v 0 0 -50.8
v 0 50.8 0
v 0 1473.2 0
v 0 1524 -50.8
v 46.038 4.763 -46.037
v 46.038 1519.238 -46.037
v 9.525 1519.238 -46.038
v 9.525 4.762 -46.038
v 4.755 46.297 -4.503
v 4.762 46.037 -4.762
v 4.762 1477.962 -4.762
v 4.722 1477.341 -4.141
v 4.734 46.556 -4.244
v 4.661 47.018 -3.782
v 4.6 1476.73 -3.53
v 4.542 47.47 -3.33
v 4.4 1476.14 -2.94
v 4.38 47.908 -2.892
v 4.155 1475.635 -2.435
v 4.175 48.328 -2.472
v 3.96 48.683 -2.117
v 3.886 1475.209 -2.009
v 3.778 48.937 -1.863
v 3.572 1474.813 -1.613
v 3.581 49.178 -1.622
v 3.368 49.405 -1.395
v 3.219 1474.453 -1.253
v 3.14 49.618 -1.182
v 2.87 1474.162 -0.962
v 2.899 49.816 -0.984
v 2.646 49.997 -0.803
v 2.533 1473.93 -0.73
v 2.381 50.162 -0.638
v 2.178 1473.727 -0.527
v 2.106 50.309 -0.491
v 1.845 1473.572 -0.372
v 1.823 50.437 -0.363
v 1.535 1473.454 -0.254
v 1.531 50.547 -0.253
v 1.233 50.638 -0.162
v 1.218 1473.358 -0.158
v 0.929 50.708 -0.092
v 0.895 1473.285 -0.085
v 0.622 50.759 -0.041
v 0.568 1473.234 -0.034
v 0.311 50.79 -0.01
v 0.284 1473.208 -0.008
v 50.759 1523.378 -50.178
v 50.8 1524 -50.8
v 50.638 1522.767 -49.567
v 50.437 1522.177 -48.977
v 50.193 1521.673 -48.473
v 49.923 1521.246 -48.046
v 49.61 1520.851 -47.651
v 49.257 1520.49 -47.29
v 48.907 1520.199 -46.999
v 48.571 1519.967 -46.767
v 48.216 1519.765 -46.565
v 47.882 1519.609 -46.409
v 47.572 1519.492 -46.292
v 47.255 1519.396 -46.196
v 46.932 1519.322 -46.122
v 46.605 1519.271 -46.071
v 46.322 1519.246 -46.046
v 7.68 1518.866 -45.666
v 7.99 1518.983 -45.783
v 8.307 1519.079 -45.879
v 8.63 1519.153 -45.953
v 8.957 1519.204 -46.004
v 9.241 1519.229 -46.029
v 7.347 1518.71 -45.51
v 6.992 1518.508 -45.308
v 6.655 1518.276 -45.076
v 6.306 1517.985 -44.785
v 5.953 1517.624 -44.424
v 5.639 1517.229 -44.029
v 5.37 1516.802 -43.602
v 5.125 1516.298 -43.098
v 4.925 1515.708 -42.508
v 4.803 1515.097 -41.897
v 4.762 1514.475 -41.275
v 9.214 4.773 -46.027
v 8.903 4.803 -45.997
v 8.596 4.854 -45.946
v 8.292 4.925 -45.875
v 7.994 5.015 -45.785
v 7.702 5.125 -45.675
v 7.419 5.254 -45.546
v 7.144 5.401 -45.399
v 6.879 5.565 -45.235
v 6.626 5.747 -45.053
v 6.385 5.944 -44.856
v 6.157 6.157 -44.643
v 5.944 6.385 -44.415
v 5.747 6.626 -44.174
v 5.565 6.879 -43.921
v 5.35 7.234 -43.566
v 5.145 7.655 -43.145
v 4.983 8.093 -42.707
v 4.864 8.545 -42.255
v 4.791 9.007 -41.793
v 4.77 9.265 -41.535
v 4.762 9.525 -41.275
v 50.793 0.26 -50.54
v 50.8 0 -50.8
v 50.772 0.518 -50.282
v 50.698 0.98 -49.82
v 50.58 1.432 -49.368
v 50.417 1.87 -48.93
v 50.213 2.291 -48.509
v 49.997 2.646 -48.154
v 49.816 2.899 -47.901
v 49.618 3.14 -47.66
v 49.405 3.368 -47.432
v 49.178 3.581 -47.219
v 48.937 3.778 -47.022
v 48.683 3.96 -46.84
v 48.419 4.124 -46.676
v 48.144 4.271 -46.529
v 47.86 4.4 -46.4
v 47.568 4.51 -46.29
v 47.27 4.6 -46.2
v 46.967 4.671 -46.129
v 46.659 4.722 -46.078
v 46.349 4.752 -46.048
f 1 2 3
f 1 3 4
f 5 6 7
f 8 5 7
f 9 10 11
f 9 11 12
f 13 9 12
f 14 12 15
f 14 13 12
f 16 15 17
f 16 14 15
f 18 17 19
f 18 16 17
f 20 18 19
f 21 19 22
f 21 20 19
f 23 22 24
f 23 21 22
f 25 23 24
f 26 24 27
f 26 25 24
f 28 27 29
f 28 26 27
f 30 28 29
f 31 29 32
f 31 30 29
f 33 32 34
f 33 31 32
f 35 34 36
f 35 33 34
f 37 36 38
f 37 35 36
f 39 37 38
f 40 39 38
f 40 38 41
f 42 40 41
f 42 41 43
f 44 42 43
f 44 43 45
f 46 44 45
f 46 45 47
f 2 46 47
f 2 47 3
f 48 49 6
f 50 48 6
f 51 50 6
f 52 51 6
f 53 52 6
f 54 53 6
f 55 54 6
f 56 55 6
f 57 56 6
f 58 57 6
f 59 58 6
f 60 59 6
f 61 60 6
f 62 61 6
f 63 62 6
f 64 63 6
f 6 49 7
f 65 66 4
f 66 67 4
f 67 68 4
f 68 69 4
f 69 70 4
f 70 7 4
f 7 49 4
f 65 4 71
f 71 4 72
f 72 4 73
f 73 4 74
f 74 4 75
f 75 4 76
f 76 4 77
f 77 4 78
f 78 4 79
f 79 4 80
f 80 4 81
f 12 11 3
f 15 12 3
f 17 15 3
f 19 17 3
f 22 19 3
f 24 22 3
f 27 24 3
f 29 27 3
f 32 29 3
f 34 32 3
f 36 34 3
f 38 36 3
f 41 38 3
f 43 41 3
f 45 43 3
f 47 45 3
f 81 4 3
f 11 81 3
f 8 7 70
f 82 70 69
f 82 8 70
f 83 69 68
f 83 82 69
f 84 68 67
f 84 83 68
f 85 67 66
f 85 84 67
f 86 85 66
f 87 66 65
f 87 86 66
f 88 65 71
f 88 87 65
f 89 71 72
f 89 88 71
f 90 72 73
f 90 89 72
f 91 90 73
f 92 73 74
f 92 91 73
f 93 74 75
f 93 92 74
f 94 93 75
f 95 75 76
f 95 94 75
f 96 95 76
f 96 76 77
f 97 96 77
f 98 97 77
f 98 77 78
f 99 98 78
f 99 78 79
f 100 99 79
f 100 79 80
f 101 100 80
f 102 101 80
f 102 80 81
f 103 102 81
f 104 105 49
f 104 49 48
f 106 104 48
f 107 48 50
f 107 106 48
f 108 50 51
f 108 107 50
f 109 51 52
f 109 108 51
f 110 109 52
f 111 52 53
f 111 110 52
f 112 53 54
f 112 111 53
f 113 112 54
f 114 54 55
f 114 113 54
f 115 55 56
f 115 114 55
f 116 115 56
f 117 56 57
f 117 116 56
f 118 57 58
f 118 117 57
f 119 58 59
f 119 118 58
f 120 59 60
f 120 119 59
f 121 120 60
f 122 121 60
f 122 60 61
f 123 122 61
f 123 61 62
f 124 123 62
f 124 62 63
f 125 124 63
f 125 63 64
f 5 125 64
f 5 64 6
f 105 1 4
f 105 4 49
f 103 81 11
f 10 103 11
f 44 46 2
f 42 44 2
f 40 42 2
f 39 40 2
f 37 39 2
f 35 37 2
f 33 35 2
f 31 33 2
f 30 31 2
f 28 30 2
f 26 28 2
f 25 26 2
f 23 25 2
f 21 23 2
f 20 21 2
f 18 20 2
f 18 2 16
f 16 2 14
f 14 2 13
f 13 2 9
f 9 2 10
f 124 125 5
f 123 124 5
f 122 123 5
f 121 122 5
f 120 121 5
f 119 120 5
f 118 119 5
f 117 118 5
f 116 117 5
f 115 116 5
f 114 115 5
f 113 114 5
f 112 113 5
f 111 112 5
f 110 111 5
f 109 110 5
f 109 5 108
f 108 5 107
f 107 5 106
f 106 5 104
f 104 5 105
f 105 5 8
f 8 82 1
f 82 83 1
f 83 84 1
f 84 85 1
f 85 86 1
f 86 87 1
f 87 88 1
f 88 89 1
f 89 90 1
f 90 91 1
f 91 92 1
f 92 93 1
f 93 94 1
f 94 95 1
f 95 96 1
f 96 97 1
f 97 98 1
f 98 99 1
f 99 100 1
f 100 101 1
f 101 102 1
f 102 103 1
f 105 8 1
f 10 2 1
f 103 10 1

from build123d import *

# Parameters (mm, degrees)
F2_DEPTH = 1524
F4_DEPTH = 50.8


# Not quite as in the source:
# - a variable given as a bare number and used for a length is read in inches; the dataset says mm whatever the document's units were


with BuildPart() as f2:
    # F1 (on Front) → F2 (new body)
    with BuildSketch(Plane.XZ):
        with BuildLine():
            ThreePointArc((4.7625, -4.7625), (3.3675960454, -1.3949039546), (0, 0))
            Line((0, 0), (0, -50.8))
            Line((0, -50.8), (50.8, -50.8))
            ThreePointArc((50.8, -50.8), (49.4050960454, -47.4324039546), (46.0375, -46.0375))
            Line((46.0375, -46.0375), (9.525, -46.0375))
            ThreePointArc((9.525, -46.0375), (6.1574039546, -44.6425960454), (4.7625, -41.275))
            Line((4.7625, -41.275), (4.7625, -4.7625))
        make_face()
    extrude(amount=-F2_DEPTH)

    # F3 (on face) → F4 (cut)
    with BuildSketch(Plane(origin=(0, 0, 0), x_dir=(0, -1, 0), z_dir=(-1, 0, 0))):
        Polygon((-50.8, 0), (0, -50.8), (0, 0), align=None)
        Polygon((-1524, 0), (-1524, -50.8), (-1473.2, 0), align=None)
    extrude(amount=-F4_DEPTH, mode=Mode.SUBTRACT)


solid = f2.part
